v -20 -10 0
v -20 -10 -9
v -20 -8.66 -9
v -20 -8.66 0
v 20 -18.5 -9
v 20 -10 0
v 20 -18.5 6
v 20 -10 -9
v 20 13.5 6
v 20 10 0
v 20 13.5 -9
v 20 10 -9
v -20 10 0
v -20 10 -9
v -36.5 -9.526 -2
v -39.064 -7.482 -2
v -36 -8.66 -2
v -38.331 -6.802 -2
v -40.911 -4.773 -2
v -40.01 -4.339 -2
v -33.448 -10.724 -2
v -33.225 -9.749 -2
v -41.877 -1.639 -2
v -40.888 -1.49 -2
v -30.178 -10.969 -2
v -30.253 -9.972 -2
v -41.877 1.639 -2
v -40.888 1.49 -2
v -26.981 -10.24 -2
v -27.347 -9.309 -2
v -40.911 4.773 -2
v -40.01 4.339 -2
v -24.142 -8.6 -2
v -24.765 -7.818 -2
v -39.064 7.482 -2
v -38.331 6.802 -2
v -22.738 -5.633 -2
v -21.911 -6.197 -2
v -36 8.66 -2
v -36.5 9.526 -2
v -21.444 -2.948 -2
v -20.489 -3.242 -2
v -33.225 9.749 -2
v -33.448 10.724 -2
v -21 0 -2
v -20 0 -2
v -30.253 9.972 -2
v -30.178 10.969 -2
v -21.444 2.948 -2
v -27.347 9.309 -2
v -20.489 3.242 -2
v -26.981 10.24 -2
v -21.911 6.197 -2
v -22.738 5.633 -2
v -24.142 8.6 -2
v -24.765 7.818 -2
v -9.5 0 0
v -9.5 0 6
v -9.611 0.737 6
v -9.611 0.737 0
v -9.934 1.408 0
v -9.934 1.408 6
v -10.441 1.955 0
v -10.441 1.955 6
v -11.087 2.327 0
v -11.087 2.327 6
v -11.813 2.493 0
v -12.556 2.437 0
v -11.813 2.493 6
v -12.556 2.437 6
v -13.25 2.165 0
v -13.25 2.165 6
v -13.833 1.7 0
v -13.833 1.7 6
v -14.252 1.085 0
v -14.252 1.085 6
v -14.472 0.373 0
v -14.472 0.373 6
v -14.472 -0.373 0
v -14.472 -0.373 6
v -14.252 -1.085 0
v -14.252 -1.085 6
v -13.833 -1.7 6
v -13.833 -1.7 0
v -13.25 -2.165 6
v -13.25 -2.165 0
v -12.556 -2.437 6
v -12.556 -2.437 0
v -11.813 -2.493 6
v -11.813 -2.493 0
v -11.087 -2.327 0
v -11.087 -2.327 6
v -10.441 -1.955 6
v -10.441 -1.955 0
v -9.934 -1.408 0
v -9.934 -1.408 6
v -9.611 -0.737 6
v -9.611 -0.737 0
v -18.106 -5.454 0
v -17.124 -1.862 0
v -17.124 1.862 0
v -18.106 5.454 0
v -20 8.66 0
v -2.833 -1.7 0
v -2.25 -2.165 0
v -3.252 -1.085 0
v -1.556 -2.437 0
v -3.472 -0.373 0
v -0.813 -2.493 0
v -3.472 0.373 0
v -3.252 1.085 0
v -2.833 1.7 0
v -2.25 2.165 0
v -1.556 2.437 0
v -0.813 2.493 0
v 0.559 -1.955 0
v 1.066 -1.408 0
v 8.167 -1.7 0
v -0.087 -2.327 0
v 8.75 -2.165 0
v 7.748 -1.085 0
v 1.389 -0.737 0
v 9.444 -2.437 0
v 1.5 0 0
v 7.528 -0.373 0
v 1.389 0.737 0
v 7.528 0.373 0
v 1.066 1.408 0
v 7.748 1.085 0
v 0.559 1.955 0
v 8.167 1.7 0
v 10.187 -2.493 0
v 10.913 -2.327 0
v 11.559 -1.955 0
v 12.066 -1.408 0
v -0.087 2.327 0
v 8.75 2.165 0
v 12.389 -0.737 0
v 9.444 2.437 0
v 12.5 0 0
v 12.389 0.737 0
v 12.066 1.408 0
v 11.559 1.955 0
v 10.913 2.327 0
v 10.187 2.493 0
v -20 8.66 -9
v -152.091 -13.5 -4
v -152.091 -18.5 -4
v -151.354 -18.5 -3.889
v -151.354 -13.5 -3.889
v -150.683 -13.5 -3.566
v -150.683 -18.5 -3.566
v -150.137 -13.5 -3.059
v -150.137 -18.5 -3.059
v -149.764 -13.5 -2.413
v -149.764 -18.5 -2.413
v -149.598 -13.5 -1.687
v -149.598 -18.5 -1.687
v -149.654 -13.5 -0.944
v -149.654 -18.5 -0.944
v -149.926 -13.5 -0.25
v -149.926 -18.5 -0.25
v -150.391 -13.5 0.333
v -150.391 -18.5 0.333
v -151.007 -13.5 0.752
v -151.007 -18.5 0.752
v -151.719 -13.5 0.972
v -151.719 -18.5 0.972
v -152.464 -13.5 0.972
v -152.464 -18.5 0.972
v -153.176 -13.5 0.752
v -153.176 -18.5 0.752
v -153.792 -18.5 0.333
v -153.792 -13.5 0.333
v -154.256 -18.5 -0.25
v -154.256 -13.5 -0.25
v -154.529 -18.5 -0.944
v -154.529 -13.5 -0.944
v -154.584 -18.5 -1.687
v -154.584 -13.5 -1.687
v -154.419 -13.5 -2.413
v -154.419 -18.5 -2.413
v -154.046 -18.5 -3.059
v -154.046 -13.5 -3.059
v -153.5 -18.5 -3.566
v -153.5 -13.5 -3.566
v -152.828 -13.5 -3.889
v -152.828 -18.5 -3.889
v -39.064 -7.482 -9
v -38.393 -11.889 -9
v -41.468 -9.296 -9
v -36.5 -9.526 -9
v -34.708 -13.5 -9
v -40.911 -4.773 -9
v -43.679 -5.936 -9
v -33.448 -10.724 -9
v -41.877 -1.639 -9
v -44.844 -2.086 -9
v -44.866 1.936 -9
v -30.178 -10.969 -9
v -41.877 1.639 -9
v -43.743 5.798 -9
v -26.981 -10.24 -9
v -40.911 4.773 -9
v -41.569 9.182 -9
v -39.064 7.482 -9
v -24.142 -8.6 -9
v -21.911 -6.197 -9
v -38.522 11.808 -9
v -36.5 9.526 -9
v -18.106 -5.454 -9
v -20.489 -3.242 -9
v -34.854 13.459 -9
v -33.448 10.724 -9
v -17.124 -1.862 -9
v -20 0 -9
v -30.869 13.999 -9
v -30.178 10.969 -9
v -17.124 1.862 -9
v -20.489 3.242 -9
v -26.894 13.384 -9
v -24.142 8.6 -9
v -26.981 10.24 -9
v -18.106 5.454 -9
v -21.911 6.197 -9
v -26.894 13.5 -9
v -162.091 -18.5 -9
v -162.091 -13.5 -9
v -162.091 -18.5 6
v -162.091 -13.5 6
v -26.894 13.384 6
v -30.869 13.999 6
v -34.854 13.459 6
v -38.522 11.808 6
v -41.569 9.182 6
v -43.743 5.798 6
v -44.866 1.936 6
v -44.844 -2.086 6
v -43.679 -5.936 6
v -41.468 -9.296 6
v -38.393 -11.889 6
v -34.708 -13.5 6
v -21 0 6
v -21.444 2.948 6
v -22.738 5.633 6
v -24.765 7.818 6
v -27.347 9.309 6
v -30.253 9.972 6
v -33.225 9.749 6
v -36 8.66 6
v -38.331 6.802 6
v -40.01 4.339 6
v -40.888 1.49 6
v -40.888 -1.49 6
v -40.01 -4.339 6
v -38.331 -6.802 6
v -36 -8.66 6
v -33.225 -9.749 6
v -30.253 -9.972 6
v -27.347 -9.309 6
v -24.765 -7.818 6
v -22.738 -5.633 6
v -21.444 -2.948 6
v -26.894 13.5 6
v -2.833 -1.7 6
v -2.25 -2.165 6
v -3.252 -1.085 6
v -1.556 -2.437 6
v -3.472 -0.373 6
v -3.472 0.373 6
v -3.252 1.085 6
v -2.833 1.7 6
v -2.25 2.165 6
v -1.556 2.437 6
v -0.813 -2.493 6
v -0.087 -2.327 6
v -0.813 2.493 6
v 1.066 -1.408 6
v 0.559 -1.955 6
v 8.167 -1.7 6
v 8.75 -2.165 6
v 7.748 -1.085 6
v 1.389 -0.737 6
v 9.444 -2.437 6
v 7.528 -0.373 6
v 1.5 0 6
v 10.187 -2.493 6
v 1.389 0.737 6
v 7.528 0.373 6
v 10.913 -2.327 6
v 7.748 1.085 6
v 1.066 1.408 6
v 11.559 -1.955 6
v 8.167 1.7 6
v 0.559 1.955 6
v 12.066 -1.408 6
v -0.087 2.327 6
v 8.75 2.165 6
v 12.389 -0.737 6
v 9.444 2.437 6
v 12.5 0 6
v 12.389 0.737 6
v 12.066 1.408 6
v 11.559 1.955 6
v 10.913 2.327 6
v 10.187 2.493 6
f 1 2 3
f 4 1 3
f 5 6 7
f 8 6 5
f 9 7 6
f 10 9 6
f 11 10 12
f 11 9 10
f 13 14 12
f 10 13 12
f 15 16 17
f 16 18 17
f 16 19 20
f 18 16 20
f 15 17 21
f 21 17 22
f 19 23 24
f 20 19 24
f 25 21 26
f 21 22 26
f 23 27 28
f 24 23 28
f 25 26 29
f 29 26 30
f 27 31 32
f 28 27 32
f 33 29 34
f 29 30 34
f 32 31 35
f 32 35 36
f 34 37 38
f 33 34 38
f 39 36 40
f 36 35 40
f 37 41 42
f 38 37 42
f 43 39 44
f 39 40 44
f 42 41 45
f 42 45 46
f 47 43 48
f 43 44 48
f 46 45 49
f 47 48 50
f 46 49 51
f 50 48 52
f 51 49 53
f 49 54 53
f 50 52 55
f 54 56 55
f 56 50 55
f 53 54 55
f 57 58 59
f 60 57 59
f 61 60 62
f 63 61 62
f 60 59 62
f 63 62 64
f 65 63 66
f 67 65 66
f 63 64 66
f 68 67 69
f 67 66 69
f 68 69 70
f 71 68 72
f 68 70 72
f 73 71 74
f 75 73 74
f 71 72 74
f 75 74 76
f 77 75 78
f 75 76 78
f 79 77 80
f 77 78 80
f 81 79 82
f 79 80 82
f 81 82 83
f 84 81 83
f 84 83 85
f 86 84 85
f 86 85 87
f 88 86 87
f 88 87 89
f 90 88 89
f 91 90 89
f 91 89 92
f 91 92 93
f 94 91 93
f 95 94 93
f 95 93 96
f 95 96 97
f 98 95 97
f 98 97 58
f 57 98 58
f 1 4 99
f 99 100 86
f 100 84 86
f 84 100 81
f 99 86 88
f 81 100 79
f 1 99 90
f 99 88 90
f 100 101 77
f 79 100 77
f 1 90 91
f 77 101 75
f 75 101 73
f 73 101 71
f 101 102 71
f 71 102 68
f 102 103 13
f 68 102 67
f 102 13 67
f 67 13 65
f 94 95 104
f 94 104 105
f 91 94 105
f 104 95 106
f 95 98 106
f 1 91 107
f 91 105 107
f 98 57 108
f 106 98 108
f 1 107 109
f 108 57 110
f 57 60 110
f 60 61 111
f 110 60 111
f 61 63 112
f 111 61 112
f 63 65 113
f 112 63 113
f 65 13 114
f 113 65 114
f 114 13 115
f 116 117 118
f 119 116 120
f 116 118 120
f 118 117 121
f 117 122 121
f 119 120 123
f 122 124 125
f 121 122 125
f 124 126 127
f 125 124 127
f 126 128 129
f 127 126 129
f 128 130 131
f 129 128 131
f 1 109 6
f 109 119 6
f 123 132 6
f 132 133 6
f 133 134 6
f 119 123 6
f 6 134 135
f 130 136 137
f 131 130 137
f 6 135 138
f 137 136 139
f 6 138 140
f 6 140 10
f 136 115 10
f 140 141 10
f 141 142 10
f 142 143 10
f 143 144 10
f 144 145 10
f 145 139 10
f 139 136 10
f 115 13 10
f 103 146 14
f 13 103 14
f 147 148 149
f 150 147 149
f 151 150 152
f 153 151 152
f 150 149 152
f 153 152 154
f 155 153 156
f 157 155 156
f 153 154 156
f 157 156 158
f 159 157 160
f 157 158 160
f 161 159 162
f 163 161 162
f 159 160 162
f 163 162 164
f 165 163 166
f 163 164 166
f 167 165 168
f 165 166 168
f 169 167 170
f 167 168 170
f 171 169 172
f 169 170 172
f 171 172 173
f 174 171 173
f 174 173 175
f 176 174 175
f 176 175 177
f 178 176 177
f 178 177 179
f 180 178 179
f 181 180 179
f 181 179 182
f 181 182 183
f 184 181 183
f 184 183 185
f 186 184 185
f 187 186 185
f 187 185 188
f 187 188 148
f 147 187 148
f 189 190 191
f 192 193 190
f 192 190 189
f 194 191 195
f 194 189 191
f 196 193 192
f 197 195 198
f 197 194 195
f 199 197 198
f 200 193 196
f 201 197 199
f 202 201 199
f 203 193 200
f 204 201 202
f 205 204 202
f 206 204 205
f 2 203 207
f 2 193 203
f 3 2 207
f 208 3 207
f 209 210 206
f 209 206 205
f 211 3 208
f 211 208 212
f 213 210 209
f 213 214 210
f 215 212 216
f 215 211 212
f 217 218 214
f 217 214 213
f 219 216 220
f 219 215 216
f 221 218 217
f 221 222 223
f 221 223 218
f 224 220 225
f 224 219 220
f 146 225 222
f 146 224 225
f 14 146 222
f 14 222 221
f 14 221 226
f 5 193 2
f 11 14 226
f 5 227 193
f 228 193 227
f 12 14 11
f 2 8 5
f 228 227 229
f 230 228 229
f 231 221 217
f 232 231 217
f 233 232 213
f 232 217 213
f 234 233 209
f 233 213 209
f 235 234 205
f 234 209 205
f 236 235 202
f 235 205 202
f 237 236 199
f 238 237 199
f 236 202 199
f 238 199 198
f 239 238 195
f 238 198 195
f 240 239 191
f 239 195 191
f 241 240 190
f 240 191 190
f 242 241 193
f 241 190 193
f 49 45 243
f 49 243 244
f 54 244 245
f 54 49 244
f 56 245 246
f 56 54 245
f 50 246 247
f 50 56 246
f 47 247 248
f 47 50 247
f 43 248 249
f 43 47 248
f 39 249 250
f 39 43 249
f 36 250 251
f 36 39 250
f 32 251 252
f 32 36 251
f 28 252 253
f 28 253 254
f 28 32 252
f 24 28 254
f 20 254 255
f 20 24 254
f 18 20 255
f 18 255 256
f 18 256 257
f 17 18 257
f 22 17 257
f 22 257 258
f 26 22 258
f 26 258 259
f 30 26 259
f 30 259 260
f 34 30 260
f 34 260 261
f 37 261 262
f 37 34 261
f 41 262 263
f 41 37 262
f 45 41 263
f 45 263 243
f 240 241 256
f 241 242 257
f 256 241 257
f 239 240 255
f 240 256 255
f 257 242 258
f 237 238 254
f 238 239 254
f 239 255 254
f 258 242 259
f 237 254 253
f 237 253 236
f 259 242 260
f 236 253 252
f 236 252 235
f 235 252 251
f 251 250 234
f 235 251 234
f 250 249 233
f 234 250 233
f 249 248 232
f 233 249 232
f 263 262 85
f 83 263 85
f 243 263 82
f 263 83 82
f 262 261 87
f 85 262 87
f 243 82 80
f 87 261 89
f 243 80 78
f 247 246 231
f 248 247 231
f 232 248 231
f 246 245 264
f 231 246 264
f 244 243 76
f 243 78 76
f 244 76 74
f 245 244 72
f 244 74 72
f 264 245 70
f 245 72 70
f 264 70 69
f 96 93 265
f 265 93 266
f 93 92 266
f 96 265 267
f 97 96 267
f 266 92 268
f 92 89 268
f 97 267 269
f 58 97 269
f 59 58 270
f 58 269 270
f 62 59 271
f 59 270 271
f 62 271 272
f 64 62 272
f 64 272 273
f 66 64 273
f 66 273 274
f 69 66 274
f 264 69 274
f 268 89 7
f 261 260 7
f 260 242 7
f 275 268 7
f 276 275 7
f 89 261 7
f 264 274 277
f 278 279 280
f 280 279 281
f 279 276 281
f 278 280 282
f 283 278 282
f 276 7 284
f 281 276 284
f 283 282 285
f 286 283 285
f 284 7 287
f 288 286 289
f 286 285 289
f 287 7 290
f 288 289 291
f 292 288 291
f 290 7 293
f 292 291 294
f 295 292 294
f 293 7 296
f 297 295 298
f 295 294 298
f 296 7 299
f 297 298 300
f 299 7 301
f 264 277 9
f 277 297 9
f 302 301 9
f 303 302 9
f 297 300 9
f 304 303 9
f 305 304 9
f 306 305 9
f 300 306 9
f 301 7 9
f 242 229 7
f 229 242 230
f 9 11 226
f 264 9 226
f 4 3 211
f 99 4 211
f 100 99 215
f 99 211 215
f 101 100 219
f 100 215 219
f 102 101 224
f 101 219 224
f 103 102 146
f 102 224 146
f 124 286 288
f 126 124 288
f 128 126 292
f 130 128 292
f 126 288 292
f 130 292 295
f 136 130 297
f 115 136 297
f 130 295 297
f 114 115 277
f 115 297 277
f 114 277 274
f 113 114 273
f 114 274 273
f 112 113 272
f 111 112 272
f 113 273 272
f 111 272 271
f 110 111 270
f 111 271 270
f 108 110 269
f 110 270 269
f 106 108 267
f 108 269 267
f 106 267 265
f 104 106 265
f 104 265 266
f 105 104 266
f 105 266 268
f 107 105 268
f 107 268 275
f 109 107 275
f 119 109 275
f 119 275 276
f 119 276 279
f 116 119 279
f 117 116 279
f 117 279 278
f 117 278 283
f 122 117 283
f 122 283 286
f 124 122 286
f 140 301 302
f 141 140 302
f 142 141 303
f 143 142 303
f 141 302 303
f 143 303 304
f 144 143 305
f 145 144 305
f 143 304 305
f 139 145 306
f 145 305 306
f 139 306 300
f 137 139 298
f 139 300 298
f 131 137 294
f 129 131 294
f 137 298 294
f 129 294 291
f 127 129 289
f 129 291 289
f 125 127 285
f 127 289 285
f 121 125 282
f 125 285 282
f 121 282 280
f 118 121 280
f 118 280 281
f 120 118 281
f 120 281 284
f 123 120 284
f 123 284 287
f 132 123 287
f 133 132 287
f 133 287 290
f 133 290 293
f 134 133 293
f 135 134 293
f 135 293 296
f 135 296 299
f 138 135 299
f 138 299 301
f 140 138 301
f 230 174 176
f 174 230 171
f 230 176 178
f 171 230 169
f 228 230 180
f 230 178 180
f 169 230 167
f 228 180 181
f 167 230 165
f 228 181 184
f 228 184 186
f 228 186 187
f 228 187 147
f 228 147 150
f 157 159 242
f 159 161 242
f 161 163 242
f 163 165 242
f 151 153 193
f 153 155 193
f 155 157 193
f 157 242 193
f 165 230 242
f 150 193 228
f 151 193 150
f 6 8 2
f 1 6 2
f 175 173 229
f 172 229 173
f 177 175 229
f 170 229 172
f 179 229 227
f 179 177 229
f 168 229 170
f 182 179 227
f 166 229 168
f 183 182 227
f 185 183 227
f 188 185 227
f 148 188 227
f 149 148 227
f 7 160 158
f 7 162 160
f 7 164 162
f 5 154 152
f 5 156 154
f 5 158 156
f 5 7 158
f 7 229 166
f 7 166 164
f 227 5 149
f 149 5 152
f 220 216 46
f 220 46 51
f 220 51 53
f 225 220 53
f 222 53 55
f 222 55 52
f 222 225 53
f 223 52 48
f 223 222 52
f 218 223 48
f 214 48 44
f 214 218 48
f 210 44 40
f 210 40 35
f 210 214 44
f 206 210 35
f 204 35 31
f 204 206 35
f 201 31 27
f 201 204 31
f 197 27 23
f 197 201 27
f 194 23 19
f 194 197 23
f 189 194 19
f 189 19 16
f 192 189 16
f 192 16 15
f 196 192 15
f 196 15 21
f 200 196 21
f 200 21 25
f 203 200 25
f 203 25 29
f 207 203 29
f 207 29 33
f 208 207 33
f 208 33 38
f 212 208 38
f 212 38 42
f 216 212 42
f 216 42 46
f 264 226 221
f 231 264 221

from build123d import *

# Parameters (mm, degrees)
SKETCH_1_W          = 40
SKETCH_1_H          = 20
EXTRUDE_1_DEPTH     = 6
SKETCH_2_R          = 2.5
CUT_EXTRUDE_1_DEPTH = 24.151673806
EXTRUDE_START       = -15
EXTRUDE_2_OUTLINE_R = 11
EXTRUDE_2_DEPTH     = 15
EXTRUDE_START_2     = -8
SKETCH_5_R          = 11
SKETCH_5_R_2        = 10
EXTRUDE_3_DEPTH     = 8
SKETCH_10_W         = 15
SKETCH_10_H         = 5
EXTRUDE_4_DEPTH     = 200
SKETCH_11_W         = 3.09493726
SKETCH_11_H         = 3.09493726
EXTRUDE_5_DEPTH     = 15
SKETCH_18_W         = 44.754670229
SKETCH_18_H         = 64.187168005
CUT_EXTRUDE_3_DEPTH = 184.131783151
SKETCH_19_R         = 2.5
CUT_EXTRUDE_4_DEPTH = 166.562236052


# Read off the part's stored shape, not the designer's step: 凸台-拉伸2
with BuildPart() as part:
    # 草图1 → 凸台-拉伸1 (new body)
    with BuildSketch(Plane.XY):
        Rectangle(SKETCH_1_W, SKETCH_1_H)
    extrude(amount=EXTRUDE_1_DEPTH)

    # 草图2 → 切除-拉伸1 (cut, through all)
    with BuildSketch(Plane.XY.offset(6)):
        with Locations((10, 0)):
            Circle(SKETCH_2_R)
        with Locations((-1, 0)):
            Circle(SKETCH_2_R)
        with Locations((-12, 0)):
            Circle(SKETCH_2_R)
    extrude(amount=-CUT_EXTRUDE_1_DEPTH, mode=Mode.SUBTRACT)

    # 凸台-拉伸2 outline → 凸台-拉伸2 (add)
    with BuildSketch(Plane.XY.offset(6).offset(EXTRUDE_START)):
        with BuildLine():
            Line((20, 10), (20, 13.5))
            Line((20, 13.5), (-26.893967141, 13.5))
            Line((-26.893967141, 13.5), (-26.893967141, 13.384337644))
            ThreePointArc((-26.893967141, 13.384337644), (-45, 0), (-26.893967141, -13.384337644))
            Line((-26.893967141, -13.384337644), (-26.893967141, -13.5))
            Line((-26.893967141, -13.5), (20, -13.5))
            Line((20, -13.5), (20, -10))
            Line((20, -10), (-20, -10))
            Line((-20, -10), (-20, -8.660254038))
            ThreePointArc((-20, -8.660254038), (-17, 0), (-20, 8.660254038))
            Line((-20, 8.660254038), (-20, 10))
            Line((-20, 10), (20, 10))
        make_face()
        with Locations((-31, 0)):
            Circle(EXTRUDE_2_OUTLINE_R, mode=Mode.SUBTRACT)
    extrude(amount=EXTRUDE_2_DEPTH)

    # 草图5 → 凸台-拉伸3 (add)
    with BuildSketch(Plane.XY.offset(6).offset(EXTRUDE_START_2)):
        with Locations((-31, 0)):
            Circle(SKETCH_5_R)
        with Locations((-31, 0)):
            Circle(SKETCH_5_R_2, mode=Mode.SUBTRACT)
    extrude(amount=EXTRUDE_3_DEPTH)

    # 草图10 → 凸台-拉伸4 (add)
    with BuildSketch(Plane(origin=(20, 0, 0), x_dir=(0, 0, -1), z_dir=(1, 0, 0))):
        with Locations((1.5, -16)):
            Rectangle(SKETCH_10_W, SKETCH_10_H)
    extrude(amount=-EXTRUDE_4_DEPTH)

    # 草图11 → 凸台-拉伸5 (add, through all)
    with BuildSketch(Plane.XY.offset(6)):
        with Locations((-27.071814196, -13.413570993)):
            Rectangle(SKETCH_11_W, SKETCH_11_H)
    extrude(amount=-EXTRUDE_5_DEPTH)

    # 草图18 → 切除-拉伸3 (cut, through all)
    with BuildSketch(Plane.XZ.offset(18.5)):
        with Locations((-184.468679753, -6.901085589)):
            Rectangle(SKETCH_18_W, SKETCH_18_H)
    extrude(amount=-CUT_EXTRUDE_3_DEPTH, mode=Mode.SUBTRACT)

    # 草图19 → 切除-拉伸4 (cut, through all)
    with BuildSketch(Plane.XZ.offset(18.5)):
        with Locations(Location((-152.091344638, -1.5, 0), (0, 0, 270))):
            Circle(SKETCH_19_R)
    extrude(amount=-CUT_EXTRUDE_4_DEPTH, mode=Mode.SUBTRACT)


solid = part.part
